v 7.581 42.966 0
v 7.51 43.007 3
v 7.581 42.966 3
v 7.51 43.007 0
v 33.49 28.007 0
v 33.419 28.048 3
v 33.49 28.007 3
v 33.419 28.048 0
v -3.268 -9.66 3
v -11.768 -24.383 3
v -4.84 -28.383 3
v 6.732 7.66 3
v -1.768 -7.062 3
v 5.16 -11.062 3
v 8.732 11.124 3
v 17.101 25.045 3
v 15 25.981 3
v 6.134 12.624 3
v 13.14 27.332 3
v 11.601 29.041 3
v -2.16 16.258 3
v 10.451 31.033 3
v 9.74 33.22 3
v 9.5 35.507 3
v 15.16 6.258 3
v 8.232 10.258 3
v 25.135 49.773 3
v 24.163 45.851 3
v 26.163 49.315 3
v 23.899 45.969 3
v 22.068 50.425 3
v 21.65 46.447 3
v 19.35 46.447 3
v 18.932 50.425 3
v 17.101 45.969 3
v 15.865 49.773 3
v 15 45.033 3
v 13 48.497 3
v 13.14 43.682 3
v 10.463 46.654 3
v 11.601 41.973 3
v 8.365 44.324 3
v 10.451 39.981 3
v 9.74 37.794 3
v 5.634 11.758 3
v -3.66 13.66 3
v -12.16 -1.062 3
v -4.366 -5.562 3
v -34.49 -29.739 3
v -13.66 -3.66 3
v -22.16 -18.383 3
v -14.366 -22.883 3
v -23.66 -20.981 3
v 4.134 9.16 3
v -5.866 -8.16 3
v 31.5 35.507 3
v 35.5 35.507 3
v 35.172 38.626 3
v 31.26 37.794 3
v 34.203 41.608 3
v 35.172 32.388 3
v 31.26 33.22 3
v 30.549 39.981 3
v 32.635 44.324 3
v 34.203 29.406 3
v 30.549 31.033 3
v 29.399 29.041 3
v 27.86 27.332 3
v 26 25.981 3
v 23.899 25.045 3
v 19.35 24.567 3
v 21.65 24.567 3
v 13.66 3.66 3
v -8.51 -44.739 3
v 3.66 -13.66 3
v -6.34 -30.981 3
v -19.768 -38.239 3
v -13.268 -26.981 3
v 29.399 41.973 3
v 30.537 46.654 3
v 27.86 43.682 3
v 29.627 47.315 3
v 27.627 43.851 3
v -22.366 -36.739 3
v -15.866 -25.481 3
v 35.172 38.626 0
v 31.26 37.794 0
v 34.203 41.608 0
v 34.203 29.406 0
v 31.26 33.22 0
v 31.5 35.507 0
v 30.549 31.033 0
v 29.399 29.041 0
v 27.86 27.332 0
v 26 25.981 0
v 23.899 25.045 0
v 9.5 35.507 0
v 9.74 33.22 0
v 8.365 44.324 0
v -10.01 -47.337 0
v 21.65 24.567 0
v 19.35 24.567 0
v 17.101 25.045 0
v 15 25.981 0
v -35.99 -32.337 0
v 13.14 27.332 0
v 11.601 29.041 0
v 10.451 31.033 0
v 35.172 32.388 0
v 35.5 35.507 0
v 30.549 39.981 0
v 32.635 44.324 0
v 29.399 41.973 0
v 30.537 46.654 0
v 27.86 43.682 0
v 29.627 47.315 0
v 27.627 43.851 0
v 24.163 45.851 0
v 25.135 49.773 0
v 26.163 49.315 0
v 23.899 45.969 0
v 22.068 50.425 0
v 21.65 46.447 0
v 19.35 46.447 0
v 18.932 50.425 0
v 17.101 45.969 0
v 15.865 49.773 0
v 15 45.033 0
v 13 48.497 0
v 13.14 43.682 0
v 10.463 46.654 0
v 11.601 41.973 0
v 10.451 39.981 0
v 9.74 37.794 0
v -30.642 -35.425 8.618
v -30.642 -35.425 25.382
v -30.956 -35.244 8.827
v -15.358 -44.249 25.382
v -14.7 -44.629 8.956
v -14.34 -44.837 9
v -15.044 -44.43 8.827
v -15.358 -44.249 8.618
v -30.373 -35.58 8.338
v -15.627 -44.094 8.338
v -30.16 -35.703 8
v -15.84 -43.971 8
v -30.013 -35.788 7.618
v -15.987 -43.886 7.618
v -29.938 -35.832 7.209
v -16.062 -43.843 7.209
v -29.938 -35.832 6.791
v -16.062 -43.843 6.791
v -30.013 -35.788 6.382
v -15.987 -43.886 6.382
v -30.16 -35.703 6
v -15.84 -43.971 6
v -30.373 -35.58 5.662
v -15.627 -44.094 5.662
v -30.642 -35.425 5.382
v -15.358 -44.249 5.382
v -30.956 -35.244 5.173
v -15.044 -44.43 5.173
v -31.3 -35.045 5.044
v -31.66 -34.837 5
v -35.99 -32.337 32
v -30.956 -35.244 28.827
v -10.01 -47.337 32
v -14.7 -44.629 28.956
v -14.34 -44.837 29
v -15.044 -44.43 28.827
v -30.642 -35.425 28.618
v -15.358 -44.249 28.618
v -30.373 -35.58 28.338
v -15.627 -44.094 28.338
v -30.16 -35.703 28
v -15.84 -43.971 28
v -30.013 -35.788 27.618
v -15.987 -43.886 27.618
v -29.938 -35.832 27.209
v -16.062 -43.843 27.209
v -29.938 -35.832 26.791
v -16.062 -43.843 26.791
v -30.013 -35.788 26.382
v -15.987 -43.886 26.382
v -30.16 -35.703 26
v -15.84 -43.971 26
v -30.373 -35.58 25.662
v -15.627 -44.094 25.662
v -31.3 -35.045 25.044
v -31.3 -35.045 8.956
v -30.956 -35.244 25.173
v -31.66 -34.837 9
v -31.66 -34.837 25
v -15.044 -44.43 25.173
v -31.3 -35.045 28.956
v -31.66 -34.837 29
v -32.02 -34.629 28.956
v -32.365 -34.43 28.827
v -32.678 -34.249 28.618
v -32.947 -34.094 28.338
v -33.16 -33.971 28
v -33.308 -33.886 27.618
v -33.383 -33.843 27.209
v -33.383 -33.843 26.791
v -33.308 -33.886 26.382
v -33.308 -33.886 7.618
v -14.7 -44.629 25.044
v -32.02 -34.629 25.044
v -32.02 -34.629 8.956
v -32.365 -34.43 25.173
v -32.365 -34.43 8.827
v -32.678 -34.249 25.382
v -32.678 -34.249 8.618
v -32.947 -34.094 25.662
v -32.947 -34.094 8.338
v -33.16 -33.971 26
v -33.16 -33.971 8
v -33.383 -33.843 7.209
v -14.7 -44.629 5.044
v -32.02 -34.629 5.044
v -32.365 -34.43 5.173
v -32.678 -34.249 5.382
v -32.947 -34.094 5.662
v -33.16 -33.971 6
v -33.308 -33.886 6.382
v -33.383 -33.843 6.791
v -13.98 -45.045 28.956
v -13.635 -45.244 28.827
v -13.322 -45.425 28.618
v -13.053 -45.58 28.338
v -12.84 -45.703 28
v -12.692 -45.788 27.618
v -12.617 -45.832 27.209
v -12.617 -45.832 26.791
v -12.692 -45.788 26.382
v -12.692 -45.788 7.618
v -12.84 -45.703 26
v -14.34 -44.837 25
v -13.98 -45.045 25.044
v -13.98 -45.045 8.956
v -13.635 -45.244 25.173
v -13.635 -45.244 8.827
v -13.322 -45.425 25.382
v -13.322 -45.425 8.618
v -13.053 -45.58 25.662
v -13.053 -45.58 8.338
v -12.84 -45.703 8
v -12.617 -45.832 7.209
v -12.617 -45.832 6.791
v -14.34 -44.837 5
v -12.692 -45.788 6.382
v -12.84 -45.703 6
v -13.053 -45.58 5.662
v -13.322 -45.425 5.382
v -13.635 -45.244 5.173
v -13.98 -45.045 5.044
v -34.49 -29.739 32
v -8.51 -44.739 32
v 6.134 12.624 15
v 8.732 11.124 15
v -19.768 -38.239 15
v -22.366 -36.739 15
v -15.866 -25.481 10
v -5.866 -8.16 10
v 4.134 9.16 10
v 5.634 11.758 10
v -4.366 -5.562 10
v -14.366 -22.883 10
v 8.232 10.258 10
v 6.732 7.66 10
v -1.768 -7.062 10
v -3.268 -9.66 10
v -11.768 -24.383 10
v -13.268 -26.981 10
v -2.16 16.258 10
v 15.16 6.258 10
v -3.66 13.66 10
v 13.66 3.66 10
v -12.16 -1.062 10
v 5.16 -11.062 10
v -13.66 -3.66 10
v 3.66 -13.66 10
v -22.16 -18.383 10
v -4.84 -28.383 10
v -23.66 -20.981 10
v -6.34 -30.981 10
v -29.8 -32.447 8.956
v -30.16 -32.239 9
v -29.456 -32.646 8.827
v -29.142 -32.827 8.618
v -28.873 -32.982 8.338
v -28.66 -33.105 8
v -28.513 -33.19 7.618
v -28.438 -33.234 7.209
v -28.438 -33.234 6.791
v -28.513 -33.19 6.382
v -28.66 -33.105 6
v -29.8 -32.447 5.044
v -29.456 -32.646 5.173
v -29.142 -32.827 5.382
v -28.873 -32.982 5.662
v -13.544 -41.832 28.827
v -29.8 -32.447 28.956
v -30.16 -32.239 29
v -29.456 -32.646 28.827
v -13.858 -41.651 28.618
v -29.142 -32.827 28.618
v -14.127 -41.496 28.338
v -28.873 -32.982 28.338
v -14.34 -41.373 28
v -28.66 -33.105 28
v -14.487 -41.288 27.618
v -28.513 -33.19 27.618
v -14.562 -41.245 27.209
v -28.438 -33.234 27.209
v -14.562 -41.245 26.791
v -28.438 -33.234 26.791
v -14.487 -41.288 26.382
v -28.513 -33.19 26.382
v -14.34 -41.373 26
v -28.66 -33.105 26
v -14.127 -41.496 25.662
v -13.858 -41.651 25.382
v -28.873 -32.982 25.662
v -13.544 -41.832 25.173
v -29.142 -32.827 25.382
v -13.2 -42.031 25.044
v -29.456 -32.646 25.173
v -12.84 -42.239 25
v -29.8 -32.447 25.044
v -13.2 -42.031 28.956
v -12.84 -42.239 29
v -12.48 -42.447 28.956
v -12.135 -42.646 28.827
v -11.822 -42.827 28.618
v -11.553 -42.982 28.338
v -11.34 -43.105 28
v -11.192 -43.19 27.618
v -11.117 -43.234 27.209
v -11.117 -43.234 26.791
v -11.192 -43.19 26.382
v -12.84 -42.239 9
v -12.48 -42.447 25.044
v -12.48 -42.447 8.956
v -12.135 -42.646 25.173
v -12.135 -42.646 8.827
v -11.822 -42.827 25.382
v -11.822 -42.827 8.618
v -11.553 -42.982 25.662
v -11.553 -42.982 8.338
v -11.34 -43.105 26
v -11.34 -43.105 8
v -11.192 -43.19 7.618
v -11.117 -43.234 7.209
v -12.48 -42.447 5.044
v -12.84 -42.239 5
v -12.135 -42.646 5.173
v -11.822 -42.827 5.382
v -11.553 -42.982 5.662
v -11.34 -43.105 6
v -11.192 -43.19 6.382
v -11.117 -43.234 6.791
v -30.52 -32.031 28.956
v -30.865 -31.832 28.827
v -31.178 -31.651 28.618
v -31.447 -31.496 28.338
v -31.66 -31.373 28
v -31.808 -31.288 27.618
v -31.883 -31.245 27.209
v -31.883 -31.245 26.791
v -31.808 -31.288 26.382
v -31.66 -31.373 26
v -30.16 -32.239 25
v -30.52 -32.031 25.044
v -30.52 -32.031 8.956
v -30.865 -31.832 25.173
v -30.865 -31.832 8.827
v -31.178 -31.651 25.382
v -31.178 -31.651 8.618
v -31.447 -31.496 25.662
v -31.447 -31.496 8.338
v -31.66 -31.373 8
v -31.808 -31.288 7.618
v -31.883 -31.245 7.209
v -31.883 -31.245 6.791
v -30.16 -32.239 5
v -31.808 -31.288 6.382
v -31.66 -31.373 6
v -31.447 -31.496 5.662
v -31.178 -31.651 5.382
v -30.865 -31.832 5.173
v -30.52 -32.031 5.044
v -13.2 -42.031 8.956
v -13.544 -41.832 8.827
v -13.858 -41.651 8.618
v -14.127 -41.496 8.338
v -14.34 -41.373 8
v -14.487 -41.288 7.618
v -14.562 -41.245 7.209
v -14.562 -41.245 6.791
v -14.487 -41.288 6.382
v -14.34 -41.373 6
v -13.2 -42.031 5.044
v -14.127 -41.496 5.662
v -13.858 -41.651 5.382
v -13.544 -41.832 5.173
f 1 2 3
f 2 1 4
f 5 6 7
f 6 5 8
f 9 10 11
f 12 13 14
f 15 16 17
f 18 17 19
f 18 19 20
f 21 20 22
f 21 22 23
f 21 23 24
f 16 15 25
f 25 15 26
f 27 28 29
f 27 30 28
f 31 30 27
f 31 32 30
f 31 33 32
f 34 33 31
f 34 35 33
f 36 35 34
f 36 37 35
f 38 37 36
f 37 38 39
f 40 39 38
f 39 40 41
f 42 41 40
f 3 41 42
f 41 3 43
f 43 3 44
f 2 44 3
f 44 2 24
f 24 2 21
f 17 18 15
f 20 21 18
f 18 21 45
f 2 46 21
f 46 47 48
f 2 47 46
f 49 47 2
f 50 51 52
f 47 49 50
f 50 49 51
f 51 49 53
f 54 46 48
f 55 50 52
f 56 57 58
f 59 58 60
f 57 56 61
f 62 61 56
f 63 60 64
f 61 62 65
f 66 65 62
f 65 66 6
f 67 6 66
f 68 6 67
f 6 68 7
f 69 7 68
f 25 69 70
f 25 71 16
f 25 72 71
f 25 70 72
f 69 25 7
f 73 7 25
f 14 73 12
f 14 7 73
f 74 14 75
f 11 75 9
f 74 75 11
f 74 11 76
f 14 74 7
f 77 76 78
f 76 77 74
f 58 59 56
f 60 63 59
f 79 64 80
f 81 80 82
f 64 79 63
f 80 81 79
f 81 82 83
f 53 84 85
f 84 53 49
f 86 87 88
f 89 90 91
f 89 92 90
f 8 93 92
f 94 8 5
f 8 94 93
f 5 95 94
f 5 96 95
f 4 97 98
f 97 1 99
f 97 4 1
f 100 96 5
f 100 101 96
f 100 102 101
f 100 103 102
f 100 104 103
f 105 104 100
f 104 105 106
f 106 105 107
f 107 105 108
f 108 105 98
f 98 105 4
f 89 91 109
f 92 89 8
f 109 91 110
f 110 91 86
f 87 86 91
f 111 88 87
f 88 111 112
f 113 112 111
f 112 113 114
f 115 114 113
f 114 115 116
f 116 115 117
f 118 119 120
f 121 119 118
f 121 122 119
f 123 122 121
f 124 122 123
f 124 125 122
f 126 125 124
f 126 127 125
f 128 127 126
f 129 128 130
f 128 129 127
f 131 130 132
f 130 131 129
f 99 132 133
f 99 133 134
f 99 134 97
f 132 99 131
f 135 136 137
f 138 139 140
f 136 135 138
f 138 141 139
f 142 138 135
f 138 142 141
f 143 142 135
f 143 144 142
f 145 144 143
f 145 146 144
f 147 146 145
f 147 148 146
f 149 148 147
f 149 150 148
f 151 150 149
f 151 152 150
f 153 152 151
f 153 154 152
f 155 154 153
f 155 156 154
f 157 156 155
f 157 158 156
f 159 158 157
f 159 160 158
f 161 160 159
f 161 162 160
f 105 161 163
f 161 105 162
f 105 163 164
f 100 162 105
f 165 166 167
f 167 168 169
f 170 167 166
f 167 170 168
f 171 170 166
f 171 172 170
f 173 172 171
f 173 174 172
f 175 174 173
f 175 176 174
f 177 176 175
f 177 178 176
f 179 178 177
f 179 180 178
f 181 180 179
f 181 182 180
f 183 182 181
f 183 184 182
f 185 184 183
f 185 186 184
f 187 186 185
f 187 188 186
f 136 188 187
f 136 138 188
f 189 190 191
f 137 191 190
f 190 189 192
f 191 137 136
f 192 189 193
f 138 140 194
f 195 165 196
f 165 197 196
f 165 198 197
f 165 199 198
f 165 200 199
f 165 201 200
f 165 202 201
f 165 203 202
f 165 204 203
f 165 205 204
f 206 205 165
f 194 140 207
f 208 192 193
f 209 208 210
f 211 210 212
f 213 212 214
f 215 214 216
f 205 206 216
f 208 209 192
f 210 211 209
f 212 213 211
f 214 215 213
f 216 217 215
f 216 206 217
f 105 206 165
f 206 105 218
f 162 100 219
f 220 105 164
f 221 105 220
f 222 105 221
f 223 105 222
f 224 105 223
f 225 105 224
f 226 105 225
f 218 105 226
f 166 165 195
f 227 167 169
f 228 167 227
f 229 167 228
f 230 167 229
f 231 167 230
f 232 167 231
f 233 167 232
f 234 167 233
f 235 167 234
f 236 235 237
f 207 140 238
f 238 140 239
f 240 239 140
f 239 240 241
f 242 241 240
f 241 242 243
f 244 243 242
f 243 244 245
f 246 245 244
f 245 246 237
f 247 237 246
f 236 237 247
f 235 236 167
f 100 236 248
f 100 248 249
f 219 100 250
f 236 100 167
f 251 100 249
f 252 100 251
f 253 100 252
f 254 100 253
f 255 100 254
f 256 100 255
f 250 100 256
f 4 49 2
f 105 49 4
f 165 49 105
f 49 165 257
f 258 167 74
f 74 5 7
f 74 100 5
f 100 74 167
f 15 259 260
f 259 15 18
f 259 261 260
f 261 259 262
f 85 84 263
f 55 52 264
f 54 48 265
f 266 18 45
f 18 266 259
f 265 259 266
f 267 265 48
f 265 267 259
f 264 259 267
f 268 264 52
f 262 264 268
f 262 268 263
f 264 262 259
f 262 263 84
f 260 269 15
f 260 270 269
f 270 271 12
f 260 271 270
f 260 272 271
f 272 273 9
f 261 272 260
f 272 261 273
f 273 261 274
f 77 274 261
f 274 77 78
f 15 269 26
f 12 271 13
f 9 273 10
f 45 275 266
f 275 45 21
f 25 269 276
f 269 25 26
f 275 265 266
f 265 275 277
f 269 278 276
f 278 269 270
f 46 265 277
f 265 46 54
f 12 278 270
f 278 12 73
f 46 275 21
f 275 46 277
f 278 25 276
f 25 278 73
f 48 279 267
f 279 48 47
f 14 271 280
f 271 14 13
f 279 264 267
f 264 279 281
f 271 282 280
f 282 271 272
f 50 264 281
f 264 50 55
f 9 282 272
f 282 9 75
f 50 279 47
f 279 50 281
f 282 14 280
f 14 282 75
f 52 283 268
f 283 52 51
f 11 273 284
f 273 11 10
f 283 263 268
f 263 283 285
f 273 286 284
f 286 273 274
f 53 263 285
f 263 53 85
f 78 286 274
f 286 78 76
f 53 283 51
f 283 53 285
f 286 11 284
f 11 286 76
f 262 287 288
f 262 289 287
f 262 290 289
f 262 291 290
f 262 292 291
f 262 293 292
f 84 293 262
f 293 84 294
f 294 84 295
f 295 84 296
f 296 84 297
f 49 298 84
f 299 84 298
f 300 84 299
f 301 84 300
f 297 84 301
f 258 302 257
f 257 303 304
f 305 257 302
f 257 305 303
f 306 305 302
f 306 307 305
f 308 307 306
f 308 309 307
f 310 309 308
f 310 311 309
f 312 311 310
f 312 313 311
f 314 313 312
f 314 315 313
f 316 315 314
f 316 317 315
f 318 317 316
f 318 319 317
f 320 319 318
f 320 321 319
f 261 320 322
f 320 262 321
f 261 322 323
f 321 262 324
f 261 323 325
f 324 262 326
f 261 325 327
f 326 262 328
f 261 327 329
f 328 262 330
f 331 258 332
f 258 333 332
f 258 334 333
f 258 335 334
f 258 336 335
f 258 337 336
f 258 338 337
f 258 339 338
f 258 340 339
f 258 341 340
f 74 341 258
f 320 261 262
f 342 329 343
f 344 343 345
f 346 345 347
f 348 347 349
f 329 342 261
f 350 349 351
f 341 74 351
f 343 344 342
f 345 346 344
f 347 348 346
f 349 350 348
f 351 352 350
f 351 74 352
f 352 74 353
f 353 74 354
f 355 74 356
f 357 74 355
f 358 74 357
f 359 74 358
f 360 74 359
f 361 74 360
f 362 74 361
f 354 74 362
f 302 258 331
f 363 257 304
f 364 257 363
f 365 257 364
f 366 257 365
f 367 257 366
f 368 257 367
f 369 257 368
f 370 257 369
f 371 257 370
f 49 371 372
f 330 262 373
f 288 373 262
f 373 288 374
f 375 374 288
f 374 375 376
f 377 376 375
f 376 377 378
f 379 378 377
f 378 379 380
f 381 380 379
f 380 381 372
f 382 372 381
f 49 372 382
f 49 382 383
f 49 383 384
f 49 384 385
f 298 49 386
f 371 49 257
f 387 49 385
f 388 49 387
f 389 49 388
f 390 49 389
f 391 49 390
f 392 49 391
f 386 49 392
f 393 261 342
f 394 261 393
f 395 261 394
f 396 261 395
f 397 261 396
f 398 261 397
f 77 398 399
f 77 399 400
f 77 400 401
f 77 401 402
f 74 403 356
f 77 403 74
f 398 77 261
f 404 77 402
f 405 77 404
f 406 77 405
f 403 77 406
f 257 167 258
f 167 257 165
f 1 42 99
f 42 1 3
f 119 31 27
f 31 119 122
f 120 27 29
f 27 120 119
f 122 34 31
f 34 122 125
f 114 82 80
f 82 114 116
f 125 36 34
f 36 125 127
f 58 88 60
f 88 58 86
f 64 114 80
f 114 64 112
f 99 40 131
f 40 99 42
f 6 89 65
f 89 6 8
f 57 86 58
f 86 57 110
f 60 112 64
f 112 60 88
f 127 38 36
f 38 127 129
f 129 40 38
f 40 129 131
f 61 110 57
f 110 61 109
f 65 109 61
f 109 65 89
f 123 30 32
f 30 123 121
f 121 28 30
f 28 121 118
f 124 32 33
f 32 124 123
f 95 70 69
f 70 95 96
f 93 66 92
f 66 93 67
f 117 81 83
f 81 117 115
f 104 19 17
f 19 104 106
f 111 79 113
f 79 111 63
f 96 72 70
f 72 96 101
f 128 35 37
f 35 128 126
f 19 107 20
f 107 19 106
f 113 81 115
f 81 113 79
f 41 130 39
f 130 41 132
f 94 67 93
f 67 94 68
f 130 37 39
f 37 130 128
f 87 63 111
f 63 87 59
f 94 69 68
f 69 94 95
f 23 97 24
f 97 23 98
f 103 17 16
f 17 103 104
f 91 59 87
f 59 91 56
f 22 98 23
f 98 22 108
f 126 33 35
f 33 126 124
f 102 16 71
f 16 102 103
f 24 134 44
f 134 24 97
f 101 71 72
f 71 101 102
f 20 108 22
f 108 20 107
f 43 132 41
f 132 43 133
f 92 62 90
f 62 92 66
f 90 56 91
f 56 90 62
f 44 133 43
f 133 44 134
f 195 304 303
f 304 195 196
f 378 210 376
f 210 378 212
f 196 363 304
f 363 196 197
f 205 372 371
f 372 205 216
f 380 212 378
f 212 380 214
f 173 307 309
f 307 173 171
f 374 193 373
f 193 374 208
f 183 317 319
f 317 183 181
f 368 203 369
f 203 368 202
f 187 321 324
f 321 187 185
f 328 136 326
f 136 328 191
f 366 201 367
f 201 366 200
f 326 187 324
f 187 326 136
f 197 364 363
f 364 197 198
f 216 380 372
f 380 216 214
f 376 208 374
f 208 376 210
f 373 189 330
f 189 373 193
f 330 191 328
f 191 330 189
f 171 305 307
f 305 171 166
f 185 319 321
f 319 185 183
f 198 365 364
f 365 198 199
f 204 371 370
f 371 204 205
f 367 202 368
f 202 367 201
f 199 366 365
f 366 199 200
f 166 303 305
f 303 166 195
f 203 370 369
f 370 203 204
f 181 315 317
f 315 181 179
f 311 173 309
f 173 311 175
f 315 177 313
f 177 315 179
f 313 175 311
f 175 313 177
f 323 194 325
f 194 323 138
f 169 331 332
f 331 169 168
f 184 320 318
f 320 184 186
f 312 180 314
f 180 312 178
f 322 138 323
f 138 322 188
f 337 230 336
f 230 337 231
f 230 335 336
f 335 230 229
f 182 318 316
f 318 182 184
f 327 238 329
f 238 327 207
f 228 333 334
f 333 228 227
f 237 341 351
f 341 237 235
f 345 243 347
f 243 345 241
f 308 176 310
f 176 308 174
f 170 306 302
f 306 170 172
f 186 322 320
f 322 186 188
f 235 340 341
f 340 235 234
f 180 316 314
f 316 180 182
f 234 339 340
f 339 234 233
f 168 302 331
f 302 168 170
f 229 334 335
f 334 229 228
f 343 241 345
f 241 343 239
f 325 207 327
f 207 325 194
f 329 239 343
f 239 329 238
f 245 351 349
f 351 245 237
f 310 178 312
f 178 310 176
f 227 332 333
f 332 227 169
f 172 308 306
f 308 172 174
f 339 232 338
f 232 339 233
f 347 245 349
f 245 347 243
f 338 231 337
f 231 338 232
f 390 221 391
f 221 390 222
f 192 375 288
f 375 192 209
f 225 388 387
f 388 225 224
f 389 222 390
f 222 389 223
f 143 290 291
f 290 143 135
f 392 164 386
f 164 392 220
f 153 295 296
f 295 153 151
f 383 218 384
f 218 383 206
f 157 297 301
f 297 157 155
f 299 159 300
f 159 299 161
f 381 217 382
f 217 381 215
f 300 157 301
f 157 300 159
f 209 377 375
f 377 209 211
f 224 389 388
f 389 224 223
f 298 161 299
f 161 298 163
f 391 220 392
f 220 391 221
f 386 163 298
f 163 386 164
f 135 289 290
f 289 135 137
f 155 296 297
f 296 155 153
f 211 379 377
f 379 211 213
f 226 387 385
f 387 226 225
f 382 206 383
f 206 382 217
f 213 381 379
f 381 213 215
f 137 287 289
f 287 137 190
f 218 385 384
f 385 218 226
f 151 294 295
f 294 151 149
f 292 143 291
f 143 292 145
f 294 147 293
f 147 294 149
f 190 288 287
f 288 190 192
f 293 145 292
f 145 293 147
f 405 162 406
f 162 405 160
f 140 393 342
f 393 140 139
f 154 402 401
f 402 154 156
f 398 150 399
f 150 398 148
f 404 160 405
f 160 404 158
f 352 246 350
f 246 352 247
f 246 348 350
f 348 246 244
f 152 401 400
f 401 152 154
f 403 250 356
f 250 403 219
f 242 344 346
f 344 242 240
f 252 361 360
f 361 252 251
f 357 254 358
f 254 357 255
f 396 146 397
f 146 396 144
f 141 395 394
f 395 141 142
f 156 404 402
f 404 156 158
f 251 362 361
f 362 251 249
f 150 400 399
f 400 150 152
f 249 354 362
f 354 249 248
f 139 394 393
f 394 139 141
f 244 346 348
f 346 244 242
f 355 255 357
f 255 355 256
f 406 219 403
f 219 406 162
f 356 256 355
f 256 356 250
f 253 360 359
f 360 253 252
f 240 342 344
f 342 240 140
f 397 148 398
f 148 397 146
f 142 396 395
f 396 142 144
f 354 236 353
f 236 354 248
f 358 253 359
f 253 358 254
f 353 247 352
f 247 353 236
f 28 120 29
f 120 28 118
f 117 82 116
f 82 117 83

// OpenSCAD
//translate([0,1,0])import_stl("filament-loop.stl",convexity=10);
rotate([0,0,60]) {
	difference() {
		union() {
			translate([-46,-15,0])cube([87,30,3]);
			translate([-46,-2,0])cube([60,3,15]);
			translate([10,-10,0])cube([3,20,10]);
			translate([-10,-10,0])cube([3,20,10]);
			translate([-30,-10,0])cube([3,20,10]);
			translate([-46,-15,0])cube([3,30,32]);
			translate([41,0,0])cylinder(3,15,15);
		}
		translate([41,0,-0.1])cylinder(3.2,11,11);
		translate([-46.1,10,27])rotate([0,90,0])cylinder(3.3,2,2,$fn=30);
		translate([-46.1,-10,27])rotate([0,90,0])cylinder(3.3,2,2,$fn=30);
		translate([-46.1,10,7])rotate([0,90,0])cylinder(3.3,2,2,$fn=30);
		translate([-46.1,-10,7])rotate([0,90,0])cylinder(3.3,2,2,$fn=30);
		translate([41,-2,-0.1])cube([20,4,3.2]);
	}
}
